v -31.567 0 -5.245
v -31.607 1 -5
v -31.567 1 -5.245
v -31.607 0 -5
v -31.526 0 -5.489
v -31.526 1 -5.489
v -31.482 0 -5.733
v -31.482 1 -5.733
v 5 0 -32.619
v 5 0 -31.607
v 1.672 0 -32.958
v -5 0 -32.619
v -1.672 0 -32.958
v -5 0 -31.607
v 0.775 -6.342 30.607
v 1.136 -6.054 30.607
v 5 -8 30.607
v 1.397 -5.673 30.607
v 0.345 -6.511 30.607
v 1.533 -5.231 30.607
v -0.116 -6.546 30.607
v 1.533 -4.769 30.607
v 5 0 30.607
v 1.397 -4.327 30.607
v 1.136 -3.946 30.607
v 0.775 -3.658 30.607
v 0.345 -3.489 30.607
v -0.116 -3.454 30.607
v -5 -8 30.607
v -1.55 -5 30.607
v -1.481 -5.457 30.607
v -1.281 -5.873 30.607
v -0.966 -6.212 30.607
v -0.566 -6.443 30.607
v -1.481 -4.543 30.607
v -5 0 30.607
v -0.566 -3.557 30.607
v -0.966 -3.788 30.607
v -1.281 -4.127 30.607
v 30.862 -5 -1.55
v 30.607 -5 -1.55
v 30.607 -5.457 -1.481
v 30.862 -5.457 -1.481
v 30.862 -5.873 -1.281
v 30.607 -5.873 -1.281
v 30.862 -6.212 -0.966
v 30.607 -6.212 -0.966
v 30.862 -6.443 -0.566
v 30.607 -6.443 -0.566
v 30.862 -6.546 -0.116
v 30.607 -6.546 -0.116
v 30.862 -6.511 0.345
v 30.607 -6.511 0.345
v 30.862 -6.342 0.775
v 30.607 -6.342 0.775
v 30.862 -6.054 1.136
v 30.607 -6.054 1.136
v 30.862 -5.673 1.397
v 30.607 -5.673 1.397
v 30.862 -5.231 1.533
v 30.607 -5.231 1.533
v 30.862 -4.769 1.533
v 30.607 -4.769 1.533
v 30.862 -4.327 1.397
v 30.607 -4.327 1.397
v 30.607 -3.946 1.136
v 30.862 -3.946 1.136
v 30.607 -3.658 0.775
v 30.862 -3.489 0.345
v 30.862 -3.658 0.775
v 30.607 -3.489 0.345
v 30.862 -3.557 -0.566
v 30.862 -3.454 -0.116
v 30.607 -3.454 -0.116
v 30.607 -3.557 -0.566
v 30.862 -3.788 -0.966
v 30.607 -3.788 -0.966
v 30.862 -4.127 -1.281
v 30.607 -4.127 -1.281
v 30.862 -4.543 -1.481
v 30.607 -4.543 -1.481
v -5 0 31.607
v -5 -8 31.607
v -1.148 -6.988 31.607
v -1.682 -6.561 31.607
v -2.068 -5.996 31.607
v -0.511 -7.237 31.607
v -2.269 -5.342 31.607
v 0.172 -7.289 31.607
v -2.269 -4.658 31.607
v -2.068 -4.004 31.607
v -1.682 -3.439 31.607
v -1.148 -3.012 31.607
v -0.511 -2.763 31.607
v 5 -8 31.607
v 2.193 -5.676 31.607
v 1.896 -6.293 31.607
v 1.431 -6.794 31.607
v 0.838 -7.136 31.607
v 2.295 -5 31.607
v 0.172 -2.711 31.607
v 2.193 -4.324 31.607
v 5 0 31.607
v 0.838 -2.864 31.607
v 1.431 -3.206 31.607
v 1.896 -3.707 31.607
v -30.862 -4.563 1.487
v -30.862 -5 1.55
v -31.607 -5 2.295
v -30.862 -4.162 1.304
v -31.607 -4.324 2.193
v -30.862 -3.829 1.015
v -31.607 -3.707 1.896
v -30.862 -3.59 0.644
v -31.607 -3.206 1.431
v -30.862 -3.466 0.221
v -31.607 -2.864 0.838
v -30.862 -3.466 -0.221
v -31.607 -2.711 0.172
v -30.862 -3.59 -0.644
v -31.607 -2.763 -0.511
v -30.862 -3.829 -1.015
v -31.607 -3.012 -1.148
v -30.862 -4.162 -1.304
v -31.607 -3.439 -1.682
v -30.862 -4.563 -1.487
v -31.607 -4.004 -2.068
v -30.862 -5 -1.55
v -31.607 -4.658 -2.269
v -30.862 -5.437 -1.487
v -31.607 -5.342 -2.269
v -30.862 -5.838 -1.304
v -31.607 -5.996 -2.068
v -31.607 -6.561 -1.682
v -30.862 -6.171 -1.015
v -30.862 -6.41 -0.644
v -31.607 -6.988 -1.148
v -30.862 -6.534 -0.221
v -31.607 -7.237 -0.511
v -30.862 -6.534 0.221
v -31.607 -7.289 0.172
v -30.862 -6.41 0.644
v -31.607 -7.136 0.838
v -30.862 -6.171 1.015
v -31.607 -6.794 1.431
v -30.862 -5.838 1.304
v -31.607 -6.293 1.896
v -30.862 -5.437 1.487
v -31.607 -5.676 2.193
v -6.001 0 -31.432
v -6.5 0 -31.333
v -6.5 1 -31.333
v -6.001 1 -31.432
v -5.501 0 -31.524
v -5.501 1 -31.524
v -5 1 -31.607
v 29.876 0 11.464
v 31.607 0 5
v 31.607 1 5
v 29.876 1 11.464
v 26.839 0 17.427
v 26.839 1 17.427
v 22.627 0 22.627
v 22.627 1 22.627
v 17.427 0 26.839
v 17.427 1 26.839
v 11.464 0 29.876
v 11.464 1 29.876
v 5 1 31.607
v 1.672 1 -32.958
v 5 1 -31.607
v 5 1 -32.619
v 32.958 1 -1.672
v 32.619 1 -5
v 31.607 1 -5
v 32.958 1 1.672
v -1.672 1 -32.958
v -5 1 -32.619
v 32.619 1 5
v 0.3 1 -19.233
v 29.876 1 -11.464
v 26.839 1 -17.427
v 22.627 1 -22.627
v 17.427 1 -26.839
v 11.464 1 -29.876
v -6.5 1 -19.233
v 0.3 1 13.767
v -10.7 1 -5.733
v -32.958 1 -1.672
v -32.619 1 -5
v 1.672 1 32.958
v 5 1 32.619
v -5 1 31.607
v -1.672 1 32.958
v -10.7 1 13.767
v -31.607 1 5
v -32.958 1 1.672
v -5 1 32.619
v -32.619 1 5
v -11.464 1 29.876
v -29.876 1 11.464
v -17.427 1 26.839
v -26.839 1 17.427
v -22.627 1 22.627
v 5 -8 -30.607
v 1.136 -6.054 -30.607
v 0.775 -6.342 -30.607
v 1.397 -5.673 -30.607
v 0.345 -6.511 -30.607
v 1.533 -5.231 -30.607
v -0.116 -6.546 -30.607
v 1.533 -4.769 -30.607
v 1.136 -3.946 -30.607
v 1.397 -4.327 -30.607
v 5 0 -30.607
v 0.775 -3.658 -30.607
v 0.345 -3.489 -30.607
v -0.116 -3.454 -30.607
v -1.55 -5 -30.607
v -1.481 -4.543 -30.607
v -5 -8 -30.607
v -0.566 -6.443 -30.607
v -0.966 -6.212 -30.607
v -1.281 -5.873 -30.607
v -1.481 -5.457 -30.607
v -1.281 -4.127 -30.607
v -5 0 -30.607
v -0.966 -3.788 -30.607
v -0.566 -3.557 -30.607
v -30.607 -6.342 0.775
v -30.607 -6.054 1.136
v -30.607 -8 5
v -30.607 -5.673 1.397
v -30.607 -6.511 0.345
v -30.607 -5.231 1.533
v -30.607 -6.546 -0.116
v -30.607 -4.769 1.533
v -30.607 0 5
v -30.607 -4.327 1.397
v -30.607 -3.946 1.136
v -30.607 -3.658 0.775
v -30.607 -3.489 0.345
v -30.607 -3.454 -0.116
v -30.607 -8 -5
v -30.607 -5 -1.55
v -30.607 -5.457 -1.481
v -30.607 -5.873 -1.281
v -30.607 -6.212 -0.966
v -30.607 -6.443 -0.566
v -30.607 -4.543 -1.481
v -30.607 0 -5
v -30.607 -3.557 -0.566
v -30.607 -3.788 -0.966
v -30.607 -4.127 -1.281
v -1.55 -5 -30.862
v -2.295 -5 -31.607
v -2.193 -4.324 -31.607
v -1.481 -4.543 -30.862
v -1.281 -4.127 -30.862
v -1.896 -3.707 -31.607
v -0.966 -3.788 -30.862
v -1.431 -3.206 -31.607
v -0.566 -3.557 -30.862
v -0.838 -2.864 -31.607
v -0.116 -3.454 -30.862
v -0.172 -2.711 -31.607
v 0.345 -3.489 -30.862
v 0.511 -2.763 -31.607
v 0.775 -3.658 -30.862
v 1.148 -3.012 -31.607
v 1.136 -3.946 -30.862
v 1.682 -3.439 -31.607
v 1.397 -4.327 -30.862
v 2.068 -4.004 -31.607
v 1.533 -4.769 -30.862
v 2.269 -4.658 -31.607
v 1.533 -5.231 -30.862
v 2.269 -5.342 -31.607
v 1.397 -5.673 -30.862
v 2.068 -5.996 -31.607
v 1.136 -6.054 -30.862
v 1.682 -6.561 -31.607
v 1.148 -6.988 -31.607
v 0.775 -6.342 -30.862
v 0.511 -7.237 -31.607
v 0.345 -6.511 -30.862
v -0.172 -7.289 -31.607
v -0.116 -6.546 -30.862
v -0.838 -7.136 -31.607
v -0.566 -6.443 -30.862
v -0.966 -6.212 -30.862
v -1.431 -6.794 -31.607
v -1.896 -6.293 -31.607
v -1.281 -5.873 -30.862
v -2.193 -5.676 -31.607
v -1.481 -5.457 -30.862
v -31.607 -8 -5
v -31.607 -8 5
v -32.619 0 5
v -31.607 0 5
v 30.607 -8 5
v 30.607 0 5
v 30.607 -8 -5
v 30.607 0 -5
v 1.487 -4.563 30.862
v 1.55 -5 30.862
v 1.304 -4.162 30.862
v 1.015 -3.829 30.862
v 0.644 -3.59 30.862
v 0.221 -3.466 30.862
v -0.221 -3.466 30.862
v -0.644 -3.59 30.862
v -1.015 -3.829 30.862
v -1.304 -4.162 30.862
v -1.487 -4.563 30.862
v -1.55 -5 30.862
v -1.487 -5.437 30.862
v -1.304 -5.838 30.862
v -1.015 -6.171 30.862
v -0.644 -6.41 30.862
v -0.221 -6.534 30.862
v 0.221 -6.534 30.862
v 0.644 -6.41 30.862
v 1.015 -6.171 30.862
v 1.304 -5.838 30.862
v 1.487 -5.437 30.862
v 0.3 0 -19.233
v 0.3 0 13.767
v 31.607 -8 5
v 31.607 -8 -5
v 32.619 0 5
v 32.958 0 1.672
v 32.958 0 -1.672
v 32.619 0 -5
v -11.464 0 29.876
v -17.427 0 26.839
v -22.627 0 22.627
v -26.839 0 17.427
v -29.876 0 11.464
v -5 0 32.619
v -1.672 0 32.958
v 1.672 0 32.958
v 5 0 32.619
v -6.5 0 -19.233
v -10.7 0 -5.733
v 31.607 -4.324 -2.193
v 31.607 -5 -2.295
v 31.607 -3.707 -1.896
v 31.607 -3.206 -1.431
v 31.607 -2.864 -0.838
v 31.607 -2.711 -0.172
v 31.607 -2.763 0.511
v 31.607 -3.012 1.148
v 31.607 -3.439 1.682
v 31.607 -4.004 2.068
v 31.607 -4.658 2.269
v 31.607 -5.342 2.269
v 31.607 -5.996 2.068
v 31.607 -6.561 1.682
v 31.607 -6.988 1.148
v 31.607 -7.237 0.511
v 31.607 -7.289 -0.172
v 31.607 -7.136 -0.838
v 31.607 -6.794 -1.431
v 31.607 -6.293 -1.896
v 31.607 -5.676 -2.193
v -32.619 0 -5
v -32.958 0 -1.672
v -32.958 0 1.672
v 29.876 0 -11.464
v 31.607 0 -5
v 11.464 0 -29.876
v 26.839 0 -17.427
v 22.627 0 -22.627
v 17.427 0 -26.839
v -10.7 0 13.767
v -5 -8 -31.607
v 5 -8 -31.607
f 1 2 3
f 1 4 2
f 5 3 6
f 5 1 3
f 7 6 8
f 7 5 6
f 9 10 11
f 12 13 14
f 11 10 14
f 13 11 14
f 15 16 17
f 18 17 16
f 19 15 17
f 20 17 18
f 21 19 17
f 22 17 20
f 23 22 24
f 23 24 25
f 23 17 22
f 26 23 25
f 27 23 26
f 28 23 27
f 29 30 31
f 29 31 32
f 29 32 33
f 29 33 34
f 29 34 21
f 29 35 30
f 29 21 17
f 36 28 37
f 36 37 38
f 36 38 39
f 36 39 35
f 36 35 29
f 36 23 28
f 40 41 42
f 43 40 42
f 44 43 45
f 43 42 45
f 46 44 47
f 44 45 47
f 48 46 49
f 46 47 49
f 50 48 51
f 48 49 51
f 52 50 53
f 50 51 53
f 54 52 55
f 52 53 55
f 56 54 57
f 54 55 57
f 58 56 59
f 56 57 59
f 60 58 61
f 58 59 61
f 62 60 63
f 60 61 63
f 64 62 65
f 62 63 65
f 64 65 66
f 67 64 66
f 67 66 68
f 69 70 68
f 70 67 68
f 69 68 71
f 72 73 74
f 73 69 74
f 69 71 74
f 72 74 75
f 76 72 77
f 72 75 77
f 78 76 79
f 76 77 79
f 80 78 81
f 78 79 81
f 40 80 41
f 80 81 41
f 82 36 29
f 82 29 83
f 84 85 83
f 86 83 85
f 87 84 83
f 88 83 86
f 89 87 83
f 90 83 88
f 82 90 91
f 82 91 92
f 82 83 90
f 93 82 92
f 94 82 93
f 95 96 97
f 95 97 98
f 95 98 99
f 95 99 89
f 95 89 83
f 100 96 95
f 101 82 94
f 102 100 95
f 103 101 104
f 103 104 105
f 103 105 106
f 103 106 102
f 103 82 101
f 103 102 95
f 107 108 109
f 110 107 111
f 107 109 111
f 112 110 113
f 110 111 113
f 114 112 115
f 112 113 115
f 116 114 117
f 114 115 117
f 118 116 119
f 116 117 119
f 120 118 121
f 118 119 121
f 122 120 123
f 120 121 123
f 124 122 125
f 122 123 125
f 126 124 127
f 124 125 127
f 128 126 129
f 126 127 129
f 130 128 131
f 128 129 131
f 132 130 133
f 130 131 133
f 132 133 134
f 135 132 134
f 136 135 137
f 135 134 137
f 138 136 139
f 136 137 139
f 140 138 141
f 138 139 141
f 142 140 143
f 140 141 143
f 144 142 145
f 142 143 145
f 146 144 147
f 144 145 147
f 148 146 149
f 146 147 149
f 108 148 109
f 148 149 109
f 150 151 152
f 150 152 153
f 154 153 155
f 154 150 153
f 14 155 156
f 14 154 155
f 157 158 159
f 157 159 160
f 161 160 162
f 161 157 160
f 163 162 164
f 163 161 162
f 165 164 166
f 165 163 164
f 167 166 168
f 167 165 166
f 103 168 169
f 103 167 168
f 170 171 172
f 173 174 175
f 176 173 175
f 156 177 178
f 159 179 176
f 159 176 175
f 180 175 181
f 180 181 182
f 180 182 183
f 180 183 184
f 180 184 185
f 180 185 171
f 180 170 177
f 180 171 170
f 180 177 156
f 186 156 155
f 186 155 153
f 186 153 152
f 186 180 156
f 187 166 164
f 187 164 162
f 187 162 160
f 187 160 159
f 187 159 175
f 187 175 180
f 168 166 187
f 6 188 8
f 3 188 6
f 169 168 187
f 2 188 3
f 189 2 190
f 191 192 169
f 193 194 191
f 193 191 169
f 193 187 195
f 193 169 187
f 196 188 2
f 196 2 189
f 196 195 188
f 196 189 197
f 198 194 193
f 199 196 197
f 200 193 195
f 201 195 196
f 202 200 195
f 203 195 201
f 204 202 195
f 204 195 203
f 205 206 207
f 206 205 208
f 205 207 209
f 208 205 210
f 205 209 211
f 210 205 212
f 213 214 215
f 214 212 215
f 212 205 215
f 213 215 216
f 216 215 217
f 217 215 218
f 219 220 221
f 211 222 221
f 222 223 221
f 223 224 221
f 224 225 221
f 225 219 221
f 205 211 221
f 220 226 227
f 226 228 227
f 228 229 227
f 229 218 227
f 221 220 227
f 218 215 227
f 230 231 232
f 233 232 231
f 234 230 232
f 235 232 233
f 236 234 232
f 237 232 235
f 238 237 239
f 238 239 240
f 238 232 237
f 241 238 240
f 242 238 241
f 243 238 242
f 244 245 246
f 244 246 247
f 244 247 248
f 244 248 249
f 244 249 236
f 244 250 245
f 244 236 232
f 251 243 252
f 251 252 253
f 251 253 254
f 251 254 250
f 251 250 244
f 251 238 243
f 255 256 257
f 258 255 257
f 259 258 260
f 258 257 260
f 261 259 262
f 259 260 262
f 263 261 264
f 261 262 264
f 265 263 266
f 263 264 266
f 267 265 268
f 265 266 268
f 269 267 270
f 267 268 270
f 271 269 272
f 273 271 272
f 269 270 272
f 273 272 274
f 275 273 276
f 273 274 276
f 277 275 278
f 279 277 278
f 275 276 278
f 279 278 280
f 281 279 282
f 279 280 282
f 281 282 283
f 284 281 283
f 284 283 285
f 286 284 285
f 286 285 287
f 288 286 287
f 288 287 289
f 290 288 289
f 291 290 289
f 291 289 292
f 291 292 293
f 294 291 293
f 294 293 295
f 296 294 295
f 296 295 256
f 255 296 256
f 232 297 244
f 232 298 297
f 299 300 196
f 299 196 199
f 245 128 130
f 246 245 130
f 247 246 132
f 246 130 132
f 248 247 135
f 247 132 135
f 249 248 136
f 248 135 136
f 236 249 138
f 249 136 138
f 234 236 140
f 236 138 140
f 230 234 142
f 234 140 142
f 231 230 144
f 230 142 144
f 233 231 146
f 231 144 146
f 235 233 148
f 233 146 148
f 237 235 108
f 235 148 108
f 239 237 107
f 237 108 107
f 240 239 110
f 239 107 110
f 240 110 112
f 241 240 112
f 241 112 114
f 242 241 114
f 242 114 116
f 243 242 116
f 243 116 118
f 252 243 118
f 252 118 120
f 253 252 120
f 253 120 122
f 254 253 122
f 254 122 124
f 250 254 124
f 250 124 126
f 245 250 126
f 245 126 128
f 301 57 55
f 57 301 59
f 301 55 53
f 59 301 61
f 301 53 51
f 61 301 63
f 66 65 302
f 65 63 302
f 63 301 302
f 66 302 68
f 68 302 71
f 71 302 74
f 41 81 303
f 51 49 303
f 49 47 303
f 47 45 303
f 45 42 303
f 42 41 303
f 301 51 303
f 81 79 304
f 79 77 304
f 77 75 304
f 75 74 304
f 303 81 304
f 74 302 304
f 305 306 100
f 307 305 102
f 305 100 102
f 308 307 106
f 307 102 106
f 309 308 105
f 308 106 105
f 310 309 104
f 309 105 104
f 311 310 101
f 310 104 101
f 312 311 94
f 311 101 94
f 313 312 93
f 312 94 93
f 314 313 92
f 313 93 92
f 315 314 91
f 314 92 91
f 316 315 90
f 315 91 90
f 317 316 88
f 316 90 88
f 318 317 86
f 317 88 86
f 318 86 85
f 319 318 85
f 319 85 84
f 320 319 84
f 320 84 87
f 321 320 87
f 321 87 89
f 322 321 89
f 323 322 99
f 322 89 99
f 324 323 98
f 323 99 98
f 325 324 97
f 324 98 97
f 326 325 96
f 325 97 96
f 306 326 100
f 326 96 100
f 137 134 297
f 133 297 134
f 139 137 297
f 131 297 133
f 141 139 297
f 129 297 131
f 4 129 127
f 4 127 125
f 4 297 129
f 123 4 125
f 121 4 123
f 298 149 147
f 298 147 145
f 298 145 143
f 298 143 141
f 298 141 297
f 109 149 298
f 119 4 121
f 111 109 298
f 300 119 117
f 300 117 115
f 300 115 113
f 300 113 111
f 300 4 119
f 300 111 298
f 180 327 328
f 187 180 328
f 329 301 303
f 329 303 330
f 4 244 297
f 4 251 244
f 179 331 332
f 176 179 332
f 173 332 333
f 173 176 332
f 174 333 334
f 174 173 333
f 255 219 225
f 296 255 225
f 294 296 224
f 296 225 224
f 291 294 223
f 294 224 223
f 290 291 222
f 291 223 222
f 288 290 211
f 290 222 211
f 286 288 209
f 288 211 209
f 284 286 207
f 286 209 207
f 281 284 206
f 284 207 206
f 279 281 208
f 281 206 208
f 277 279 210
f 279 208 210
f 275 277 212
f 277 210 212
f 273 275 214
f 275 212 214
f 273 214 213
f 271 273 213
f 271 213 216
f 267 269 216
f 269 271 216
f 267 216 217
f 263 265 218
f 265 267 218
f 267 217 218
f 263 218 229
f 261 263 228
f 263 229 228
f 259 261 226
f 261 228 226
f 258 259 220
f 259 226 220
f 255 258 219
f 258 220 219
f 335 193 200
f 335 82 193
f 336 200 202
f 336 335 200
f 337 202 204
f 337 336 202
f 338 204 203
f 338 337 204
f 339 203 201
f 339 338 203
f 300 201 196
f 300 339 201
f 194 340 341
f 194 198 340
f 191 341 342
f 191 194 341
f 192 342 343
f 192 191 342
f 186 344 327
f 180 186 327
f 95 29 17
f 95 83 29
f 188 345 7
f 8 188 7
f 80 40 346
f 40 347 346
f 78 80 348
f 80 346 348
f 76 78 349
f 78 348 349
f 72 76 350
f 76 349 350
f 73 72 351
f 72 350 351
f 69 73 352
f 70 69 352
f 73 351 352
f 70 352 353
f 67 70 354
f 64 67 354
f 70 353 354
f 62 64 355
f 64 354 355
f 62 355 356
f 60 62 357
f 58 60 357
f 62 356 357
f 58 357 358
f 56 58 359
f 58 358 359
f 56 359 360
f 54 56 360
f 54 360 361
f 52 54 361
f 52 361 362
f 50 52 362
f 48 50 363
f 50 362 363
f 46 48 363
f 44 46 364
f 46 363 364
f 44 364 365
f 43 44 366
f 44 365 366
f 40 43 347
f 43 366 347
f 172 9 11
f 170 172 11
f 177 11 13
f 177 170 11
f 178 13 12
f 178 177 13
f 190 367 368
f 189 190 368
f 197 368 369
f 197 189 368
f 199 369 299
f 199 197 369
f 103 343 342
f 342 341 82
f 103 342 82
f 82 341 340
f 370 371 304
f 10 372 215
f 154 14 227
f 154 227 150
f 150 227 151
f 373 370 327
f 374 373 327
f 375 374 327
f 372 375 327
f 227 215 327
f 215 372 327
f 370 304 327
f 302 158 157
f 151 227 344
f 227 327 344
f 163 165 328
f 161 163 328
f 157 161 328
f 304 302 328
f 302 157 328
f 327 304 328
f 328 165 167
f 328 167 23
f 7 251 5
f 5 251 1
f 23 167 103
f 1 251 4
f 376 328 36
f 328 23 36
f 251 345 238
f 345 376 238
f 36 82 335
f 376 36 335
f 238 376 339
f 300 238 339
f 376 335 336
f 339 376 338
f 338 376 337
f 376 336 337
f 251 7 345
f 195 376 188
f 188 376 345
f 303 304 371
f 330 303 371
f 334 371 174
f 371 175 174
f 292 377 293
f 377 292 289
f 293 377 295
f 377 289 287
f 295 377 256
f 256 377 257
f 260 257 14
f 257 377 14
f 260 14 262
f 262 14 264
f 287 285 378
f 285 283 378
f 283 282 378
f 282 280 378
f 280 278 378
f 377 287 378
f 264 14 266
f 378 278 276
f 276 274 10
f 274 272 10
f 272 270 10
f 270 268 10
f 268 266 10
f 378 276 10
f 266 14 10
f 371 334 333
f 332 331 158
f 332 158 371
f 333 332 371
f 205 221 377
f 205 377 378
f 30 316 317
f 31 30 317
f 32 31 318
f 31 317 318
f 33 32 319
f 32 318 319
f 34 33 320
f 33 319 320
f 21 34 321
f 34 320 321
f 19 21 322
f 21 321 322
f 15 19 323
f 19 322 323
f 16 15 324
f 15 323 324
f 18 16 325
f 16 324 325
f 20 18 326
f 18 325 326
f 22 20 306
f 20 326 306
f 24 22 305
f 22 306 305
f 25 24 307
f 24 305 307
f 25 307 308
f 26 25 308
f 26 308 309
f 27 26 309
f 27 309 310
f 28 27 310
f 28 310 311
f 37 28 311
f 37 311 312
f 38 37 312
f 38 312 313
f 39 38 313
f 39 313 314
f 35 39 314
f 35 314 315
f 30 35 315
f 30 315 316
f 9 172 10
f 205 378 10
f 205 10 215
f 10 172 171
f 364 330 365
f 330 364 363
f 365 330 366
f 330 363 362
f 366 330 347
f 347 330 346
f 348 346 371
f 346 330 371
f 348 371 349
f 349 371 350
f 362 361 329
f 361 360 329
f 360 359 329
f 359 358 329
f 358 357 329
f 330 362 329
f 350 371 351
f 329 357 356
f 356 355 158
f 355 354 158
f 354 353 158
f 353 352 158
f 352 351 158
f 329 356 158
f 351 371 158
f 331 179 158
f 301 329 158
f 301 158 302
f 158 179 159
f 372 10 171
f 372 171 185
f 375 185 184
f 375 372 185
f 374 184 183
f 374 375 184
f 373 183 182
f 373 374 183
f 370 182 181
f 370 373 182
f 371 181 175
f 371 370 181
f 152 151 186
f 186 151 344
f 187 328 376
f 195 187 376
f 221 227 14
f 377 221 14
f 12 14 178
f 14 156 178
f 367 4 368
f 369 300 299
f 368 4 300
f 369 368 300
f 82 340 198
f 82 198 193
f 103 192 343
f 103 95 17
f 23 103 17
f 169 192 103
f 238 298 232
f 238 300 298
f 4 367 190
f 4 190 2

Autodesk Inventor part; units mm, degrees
ref_plane "YZ Plane" through (0, 0, 0) normal (1, 0, 0) x (0, 1, 0)
ref_plane "XZ Plane" through (0, 0, 0) normal (0, 1, 0) x (-1, 0, 0)
sketch "Sketch1" plane through (0, 0, 0) normal (0, 1, 0) x (-1, 0, 0)
  arc A0 (31.6389, 4.7938) -> (6.5, -31.3329) centre (0, 0) ccw
  line L0 (-5, 33) -> (5, 33)
  line L1 (5, 33) -> (5, 31.607)
  line L2 (5, -33) -> (-5, -33)
  line L3 (-5, -33) -> (-5, 5)
  line L4 (-5, 33) -> (5, -33) construction
  line L5 (5, 33) -> (-5, -33) construction
  line L6 (-33, 5) -> (-5, 5)
  line L7 (33, 5) -> (33, -5)
  line L8 (33, -5) -> (31.607, -5)
  line L9 (-33, -5) -> (-33, 5)
  line L10 (-33, 5) -> (33, -5) construction
  line L11 (33, 5) -> (-33, -5) construction
  arc A1 (4.7938, -31.6389) -> (6.5, -31.3329) centre (0, 0) ccw
  line L12 (6.5, -31.3329) -> (6.5, -19.2329)
  line L13 (6.5, -19.2329) -> (-0.3, -19.2329)
  line L14 (-0.3, -19.2329) -> (-0.3, -5.7329)
  line L15 (-0.3, 13.7671) -> (5, 13.7671)
  line L16 (10.7, 13.7671) -> (10.7, 5)
  line L17 (10.7, -5.7329) -> (31.4823, -5.7329)
  arc A2 (31.4823, -5.7329) -> (31.607, -5) centre (0, 0) ccw
  arc A3 (31.6389, -4.7938) -> (31.6389, 4.7938) centre (0, 0) ccw
  line L18 (5, -19.2329) -> (5, -33)
  line L19 (5, 13.7671) -> (5, 5)
  line L20 (10.7, 1.6212) -> (10.7, -5.7329)
  line L21 (-0.3, -5) -> (-0.3, 5)
  arc A4 (6.5, -31.3329) -> (10.7, -30.1581) centre (0, 0) ccw
  line L22 (5, -5) -> (0.7576, -5)
  line L23 (5, 5) -> (10.7, 5)
  line L24 (-5, 5) -> (-0.3, 5)
  line L25 (-5, -5) -> (-33, -5)
  line L26 (-5, 5) -> (-5, 33)
  line L27 (5, 5) -> (5, -5)
  line L28 (5, 31.607) -> (5, 13.7671)
  arc A5 (10.7, -30.1581) -> (31.4823, -5.7329) centre (0, 0) ccw
  arc A6 (6.5, -31.3329) -> (31.6389, -4.7938) centre (0, 0) ccw
  line L29 (-0.3, -5.7329) -> (-0.3, -5)
  line L30 (5, -5) -> (5, -5.7329)
  line L31 (10.7, 5) -> (31.607, 5)
  line L32 (10.7, -5) -> (5, -5)
  line L33 (0.7576, 5) -> (5, 5)
  line L34 (-0.3, 5) -> (0.7576, 5)
  line L35 (5, 13.7671) -> (10.7, 13.7671)
  line L36 (-0.3, 5) -> (-0.3, 13.7671)
  line L37 (31.607, 5) -> (33, 5)
  line L38 (10.7, 5) -> (10.7, 1.6212)
  line L39 (31.607, -5) -> (10.7, -5)
  line L40 (0.7576, -5) -> (-5, -5)
  line L41 (5, -5.7329) -> (5, -19.2329)
  dimension "d0" = 64
  dimension "d1" = 10
  dimension "d2" = 66
  dimension "d3" = 66
  dimension "d4" = 10
  dimension "d11" = 12.1
  dimension "d12" = 6.8
  dimension "d13" = 33
  dimension "d14" = 0.3
  dimension "d15" = 11
  dimension "d16" = 19.5
ref_plane "Work Plane1" through (0, 1, 0) normal (0, 1, 0) x (1, 0, 0)
sketch "Sketch2" plane through (0, 1, 0) normal (0, 1, 0) x (1, 0, 0)
  circle A0 centre (0, 0) radius 33
  dimension "d7" = 66
extrude "Extrusion2" [suppressed]
extrude "Extrusion3" add sketch "Sketch1" along normal blind 1 contours A3 A6 L39 L20 L38 L31 A0 | A0 L37 L7 L8 A6 A3 | L31 L16 L35 L28 A0 | L28 L15 L36 L24 L26 A0 | A0 L26 L0 L1 | A2 L17 L20 L39 | L26 L6 A0 | L6 L3 L25 A0 | A0 L25 L9 L6 | L24 L21 L40 L3 | L25 L3 A0 | L40 L29 L14 L13 L18 A0 L3 | A0 L18 L13 L12 | A0 L18 L2 L3
sketch "Sketch3" plane through (0, 0, 0) normal (0, -1, 0) x (1, 0, 0)
  line L0 (-5, -33) -> (-5, -31.607) projected
  line L1 (-5, -31.607) -> (5, -31.607)
  line L2 (5, -31.607) -> (5, -30.607)
  line L3 (5, -30.607) -> (-5, -30.607)
  line L4 (-5, -30.607) -> (-5, -31.607)
  line L5 (-33, 5) -> (-31.607, 5) projected
  line L6 (-31.607, 5) -> (-30.607, 5)
  line L7 (-30.607, 5) -> (-30.607, -5)
  line L8 (-30.607, -5) -> (-31.607, -5)
  line L9 (-31.607, -5) -> (-31.607, 5)
  line L10 (-5, 31.607) -> (-5, 33) projected
  line L11 (-5, 31.607) -> (5, 31.607)
  line L12 (5, 31.607) -> (5, 30.607)
  line L13 (5, 30.607) -> (-5, 30.607)
  line L14 (-5, 30.607) -> (-5, 31.607)
  line L15 (31.607, 5) -> (30.607, 5)
  line L16 (30.607, 5) -> (30.607, -5)
  line L17 (30.607, -5) -> (31.607, -5)
  line L18 (31.607, -5) -> (31.607, 5)
  line L19 (31.607, 5) -> (33, 5) projected
  dimension "d21" = 10
  dimension "d22" = 1
  dimension "d23" = 1
  dimension "d24" = 10
  dimension "d25" = 10
  dimension "d26" = 1
  dimension "d27" = 1
  dimension "d28" = 10
extrude "Extrusion4" add sketch "Sketch3" along normal blind 8
sketch "Sketch4" plane through (31.607, 0, 5) normal (1, 0, 0) x (0, 0, -1)
  circle A0 centre (5, -5) radius 2.295
  line L0 (0, 0) -> (10, 0) projected
  point P0 (5, 0)
  point P1 (5, 0)
  dimension "d31" = 4.59
  dimension "d32" = 5
hole "Hole1" at (31.607, -5, 0) direction (-1, 0, 0) diameter 3.1 end through all countersink diameter 4.59 countersink angle 90
pattern_circular "Circular Pattern1" count 4 over 360 about axis through (0, 0, 0) along (0, 1, 0) of "Hole1"
sketch "Sketch5" plane through (0, 1, 0) normal (0, 1, 0) x (1, 0, 0)
  circle A0 centre (0, 0) radius 33
  dimension "d43" = 66
extrude "Extrusion5" cut sketch "Sketch5" against normal blind 100 keep common part
properties part number "Hull_top"
